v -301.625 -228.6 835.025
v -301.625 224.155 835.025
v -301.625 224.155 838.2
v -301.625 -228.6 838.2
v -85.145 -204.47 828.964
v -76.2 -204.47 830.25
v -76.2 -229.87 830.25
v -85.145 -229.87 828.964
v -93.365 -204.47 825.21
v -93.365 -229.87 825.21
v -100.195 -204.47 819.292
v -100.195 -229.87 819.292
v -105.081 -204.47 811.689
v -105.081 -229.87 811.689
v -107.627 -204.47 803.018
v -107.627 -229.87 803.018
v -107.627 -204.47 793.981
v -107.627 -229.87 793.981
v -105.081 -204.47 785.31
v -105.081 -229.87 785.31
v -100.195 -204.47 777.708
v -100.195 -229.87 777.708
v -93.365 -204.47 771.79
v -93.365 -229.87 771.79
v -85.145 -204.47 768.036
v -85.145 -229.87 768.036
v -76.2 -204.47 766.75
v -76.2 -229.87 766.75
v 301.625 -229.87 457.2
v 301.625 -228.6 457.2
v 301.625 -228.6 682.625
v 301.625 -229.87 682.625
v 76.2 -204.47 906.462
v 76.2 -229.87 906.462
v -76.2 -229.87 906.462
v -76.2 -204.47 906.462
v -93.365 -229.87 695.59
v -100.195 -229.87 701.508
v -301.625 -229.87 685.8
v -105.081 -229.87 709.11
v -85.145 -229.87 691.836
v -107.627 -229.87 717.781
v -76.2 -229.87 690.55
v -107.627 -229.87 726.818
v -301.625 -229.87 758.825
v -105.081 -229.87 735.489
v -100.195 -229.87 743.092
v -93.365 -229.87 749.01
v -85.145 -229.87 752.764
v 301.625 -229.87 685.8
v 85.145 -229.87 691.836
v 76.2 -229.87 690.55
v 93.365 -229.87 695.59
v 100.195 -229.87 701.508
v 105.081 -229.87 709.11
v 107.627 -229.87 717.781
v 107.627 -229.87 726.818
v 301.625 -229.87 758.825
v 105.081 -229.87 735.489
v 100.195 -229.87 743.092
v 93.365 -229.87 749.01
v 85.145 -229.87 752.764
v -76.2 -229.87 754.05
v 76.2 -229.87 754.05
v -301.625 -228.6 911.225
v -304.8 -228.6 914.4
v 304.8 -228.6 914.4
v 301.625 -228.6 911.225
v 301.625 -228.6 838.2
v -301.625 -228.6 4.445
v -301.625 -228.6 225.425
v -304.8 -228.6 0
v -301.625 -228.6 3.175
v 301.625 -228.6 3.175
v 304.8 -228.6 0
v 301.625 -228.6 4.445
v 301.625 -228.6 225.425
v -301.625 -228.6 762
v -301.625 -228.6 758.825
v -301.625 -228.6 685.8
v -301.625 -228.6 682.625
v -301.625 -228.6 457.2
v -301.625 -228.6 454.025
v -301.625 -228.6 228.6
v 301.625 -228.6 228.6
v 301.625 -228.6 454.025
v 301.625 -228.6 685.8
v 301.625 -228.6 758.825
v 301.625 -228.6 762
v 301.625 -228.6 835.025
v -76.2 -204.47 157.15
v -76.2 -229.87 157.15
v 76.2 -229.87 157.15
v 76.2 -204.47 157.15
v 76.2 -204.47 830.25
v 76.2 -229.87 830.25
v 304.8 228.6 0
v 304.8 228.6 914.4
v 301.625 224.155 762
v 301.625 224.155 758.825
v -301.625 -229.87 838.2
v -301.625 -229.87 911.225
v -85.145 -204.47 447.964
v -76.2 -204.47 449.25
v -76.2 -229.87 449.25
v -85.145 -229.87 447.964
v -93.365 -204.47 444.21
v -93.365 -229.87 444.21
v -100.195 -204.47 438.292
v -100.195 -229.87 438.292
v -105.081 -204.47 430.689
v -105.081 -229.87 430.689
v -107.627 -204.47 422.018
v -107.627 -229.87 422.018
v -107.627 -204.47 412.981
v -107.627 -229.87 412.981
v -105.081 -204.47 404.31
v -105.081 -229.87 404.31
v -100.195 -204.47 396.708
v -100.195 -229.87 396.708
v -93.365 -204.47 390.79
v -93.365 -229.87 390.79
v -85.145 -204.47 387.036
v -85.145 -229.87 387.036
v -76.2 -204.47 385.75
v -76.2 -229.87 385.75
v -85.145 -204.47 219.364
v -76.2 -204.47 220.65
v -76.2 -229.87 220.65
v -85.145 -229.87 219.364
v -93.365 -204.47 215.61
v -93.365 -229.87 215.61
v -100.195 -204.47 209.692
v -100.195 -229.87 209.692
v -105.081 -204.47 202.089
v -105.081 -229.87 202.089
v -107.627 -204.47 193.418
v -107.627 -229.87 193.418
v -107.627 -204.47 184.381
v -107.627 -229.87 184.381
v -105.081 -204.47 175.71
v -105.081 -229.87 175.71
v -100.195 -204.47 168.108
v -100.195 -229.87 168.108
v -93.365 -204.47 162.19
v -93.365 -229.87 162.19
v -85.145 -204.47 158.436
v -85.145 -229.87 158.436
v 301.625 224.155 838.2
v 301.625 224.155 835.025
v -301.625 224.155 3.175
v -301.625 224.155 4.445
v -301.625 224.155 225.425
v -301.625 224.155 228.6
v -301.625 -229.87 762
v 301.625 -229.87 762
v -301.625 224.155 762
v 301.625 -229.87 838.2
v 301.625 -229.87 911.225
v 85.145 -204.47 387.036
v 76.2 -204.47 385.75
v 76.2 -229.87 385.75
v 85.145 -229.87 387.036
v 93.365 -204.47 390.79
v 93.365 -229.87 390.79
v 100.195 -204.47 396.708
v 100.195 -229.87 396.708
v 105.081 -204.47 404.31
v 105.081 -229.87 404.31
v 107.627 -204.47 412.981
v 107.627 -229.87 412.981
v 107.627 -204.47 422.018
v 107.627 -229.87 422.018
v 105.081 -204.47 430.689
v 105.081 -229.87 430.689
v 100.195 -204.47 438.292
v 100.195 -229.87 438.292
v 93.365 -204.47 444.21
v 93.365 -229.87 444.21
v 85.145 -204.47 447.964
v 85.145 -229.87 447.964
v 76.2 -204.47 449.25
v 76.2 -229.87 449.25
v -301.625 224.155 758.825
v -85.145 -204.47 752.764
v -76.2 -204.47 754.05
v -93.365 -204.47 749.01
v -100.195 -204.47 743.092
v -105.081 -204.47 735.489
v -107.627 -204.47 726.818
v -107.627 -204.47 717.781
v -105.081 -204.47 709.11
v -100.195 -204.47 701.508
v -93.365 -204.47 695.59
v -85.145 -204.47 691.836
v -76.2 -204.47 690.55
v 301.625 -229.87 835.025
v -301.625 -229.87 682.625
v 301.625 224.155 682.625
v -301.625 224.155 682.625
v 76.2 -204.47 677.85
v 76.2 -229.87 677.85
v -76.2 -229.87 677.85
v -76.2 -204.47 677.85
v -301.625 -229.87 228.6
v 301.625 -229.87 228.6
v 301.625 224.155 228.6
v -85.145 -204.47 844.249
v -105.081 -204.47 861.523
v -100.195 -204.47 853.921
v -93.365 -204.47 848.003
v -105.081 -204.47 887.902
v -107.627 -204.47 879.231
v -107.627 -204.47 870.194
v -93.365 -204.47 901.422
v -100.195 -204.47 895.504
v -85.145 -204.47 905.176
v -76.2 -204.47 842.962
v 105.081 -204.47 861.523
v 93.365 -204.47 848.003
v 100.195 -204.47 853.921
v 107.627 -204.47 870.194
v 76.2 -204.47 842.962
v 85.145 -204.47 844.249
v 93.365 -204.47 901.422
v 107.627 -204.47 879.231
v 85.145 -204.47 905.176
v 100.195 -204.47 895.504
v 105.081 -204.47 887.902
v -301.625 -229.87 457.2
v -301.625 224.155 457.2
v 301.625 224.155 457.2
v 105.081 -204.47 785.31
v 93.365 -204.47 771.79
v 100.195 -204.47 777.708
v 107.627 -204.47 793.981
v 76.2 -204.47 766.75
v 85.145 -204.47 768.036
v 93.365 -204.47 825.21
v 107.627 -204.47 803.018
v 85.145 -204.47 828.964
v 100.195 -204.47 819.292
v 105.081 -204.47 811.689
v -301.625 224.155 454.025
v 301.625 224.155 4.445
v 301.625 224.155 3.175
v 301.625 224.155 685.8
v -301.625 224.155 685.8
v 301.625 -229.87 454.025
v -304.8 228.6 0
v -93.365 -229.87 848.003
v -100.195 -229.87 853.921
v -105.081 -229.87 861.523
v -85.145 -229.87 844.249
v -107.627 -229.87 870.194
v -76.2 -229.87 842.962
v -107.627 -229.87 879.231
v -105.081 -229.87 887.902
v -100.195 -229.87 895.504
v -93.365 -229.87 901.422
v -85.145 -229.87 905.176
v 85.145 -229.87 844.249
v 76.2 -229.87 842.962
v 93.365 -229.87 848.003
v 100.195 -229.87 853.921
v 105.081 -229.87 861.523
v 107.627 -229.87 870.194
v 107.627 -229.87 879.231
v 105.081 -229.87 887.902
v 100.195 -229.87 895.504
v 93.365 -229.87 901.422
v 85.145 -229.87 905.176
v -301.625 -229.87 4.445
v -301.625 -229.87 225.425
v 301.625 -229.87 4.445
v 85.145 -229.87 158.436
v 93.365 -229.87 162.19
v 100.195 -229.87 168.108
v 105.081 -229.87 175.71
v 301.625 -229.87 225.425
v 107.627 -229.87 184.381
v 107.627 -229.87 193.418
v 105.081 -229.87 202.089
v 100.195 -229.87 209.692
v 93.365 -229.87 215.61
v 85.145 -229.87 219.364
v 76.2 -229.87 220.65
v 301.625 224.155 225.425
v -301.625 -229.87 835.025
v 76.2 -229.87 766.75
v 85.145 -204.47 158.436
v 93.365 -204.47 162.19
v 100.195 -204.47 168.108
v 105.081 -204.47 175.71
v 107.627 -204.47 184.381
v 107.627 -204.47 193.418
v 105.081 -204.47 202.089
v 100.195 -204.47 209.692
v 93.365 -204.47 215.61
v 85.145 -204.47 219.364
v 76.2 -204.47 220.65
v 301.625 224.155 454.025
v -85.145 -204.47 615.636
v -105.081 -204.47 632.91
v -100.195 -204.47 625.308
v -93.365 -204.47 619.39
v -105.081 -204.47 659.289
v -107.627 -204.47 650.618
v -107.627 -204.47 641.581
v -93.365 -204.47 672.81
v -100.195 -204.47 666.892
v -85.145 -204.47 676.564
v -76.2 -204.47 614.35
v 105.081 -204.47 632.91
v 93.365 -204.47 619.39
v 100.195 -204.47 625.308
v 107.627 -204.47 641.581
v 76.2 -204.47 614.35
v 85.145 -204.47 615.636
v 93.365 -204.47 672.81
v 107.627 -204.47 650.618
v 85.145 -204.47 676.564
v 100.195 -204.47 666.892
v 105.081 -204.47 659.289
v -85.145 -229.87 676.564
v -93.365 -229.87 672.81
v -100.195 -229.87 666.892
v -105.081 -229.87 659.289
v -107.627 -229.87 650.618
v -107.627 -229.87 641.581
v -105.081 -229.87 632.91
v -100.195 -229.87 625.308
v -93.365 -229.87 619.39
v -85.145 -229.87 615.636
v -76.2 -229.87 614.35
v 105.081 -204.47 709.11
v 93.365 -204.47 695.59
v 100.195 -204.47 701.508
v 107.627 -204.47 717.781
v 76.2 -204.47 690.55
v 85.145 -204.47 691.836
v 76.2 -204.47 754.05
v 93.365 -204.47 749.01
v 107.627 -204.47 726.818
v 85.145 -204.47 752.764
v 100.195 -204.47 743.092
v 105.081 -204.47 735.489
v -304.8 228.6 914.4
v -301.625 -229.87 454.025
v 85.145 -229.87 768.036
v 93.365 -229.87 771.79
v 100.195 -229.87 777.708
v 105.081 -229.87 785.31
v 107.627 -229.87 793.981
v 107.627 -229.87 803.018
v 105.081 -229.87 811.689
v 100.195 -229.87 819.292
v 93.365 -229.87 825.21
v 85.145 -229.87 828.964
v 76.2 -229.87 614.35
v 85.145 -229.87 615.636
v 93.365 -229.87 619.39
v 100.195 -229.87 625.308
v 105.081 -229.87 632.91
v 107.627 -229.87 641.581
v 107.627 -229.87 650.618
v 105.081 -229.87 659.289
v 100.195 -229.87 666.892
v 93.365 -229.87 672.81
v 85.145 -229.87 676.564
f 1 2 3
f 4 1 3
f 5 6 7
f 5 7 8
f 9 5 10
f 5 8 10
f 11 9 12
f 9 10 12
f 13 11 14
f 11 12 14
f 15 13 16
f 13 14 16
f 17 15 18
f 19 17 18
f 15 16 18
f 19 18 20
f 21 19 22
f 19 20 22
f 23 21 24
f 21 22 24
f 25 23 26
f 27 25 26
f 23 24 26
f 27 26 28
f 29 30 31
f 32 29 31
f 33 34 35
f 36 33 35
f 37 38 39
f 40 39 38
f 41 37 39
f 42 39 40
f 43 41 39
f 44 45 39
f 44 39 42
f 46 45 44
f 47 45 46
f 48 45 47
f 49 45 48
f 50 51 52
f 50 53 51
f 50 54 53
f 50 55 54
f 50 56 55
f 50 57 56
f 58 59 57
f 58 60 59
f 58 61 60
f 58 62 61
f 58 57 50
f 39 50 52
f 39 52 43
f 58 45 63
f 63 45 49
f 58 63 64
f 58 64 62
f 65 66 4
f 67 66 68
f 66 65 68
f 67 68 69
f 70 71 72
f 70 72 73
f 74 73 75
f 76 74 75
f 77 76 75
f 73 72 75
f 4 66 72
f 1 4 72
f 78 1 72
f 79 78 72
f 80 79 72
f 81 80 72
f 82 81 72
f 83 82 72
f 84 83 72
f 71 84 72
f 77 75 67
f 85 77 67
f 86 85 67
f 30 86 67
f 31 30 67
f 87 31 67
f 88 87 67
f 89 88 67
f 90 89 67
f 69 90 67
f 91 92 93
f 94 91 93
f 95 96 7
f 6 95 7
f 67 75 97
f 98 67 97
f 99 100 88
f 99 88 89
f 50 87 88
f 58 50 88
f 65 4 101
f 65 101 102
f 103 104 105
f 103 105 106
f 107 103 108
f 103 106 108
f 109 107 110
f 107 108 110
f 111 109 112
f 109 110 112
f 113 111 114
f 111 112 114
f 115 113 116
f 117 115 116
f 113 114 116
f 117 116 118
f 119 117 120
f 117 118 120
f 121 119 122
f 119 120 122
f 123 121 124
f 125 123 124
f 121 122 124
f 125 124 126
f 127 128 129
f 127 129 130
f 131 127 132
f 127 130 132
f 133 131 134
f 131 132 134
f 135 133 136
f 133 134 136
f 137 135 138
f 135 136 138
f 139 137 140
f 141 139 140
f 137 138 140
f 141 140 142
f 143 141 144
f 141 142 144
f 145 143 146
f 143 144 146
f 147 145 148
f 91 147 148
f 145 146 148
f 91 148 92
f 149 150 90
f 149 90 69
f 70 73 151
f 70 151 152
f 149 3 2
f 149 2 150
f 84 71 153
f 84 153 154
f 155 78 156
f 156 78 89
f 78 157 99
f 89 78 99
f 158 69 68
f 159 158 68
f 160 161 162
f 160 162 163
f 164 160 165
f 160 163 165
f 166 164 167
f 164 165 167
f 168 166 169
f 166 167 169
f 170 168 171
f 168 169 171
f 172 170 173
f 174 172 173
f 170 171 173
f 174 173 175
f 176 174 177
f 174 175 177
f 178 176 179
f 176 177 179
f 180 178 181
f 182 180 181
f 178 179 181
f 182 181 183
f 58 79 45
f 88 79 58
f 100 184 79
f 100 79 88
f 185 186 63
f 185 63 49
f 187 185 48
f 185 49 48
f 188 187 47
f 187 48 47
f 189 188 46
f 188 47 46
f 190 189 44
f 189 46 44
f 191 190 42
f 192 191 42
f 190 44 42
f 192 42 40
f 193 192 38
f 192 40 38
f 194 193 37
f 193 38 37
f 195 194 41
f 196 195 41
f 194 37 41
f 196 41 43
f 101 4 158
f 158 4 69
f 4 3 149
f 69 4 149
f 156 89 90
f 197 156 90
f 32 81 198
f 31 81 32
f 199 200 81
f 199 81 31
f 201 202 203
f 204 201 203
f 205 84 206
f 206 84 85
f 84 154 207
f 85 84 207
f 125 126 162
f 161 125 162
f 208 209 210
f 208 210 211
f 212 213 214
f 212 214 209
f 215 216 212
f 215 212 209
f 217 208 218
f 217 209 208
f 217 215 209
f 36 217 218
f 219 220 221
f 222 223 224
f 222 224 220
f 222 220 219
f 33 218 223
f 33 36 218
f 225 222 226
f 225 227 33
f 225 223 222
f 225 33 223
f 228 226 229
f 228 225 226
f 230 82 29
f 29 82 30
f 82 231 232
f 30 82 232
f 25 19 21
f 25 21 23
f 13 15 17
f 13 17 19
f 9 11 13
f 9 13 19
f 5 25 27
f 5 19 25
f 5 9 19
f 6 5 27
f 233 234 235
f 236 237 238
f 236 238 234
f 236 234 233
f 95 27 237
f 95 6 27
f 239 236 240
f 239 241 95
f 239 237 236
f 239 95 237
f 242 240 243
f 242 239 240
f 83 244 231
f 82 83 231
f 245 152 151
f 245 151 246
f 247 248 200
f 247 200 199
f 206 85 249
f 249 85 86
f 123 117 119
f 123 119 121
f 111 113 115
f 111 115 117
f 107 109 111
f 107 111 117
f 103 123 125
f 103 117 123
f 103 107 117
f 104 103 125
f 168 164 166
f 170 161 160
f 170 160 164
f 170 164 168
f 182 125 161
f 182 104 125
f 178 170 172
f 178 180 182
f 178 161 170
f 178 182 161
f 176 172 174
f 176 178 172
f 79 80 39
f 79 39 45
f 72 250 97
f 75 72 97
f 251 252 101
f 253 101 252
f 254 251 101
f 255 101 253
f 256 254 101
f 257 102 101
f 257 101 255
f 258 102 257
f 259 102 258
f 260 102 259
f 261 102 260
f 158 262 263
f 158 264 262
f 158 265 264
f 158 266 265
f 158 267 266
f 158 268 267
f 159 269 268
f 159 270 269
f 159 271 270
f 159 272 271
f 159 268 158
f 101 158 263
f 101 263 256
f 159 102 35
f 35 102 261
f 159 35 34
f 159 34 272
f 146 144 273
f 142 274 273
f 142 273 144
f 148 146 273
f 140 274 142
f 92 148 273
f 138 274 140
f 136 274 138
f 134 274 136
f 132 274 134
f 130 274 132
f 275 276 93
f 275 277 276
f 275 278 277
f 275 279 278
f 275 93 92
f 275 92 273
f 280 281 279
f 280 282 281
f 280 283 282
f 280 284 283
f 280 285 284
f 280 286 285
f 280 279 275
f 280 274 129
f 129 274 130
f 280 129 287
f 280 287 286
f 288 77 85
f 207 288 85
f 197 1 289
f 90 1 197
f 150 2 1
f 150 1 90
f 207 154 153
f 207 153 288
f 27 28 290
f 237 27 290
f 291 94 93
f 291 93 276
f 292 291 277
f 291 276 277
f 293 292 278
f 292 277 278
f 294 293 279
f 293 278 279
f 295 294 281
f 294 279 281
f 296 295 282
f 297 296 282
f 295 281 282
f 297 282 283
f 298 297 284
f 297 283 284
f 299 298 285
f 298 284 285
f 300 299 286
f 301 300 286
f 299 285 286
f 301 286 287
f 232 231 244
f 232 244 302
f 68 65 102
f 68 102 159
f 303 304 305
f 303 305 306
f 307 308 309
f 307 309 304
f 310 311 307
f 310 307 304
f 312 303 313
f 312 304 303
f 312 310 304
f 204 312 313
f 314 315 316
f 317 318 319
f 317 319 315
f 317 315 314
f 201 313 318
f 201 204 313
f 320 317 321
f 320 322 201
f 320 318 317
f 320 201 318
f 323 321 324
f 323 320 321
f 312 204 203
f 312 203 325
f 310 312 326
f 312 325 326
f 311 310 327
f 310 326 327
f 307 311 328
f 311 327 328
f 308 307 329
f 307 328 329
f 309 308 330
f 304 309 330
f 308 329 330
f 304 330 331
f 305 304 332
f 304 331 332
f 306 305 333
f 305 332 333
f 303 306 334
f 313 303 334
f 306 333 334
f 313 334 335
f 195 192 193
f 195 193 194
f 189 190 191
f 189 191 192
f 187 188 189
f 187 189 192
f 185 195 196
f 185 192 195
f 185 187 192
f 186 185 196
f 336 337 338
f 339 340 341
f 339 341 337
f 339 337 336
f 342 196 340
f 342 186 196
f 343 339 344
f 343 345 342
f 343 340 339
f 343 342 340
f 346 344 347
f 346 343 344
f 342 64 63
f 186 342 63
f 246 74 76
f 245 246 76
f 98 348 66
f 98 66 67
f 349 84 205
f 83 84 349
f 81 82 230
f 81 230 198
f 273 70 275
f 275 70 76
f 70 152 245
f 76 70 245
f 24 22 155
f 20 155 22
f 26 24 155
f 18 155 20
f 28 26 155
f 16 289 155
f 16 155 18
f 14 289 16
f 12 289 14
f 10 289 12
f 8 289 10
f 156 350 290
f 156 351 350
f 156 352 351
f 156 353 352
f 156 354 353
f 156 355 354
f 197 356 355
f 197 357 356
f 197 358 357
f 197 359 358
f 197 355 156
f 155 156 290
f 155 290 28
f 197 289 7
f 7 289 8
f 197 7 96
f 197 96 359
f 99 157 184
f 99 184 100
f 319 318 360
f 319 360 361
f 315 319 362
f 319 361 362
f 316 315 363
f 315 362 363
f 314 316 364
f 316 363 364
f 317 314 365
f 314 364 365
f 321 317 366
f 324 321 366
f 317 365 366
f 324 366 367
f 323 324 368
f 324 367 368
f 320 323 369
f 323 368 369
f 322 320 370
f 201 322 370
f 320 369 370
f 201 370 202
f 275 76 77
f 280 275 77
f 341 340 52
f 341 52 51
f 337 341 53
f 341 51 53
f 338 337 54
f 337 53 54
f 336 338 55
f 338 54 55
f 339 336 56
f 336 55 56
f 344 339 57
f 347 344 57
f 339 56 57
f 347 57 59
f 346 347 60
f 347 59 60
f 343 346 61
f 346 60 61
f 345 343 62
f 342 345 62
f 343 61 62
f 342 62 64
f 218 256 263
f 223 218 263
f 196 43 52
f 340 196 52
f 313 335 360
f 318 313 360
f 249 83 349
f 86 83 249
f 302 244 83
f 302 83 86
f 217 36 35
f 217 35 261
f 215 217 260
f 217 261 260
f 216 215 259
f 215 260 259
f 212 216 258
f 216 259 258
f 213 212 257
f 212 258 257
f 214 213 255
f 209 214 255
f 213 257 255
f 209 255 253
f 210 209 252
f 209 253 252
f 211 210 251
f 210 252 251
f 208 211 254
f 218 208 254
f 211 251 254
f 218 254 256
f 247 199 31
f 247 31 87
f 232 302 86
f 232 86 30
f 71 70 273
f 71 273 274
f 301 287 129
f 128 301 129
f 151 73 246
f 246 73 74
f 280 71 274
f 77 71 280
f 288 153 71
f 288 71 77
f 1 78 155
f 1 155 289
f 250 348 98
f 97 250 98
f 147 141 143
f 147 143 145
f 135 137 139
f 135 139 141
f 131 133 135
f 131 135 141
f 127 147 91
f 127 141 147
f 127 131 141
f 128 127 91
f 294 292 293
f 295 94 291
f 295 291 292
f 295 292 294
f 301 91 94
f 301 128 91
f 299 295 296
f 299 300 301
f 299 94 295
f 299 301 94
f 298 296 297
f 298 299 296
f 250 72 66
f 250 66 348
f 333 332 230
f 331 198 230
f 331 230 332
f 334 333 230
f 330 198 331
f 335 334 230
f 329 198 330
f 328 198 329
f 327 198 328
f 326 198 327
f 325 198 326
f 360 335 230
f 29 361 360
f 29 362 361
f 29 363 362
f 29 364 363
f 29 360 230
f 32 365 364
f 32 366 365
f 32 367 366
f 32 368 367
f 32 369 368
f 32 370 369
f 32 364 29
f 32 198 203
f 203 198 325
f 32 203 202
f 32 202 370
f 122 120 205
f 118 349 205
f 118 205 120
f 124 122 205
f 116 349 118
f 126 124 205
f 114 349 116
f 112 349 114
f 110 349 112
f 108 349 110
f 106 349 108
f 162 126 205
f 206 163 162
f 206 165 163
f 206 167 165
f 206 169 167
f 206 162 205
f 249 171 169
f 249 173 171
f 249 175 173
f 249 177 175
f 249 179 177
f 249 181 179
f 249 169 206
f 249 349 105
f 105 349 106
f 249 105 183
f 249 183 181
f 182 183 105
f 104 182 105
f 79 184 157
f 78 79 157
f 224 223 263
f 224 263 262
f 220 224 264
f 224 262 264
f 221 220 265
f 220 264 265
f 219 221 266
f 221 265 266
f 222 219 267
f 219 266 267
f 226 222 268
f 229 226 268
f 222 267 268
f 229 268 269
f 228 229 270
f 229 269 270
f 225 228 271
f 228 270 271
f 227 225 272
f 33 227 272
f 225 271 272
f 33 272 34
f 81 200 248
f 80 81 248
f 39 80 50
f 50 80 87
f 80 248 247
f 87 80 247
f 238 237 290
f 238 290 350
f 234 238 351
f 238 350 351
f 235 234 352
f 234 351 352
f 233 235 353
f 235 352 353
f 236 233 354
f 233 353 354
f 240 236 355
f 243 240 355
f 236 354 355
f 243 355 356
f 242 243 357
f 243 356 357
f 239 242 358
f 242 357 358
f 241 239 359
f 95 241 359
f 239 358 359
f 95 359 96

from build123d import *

# Parameters (mm, degrees)
F0_W     = 609.6
F0_H     = 457.2
F1_DEPTH = 914.4
F2_W     = 603.25
F2_H     = 908.05
F3_DEPTH = 452.755
F4_W     = 603.25
F4_H     = 73.025
F4_H_2   = 225.425
F4_H_3   = 220.98
F5_DEPTH = 454.025
F7_DEPTH = 25.4


with BuildPart() as f1:
    # F0 (on Top) → F1 (new body)
    with BuildSketch(Plane.XY):
        Rectangle(F0_W, F0_H)
    extrude(amount=F1_DEPTH)

    # F2 (on face) → F3 (cut)
    with BuildSketch(Plane.XZ.offset(228.6)):
        with Locations((0, 457.2)):
            Rectangle(F2_W, F2_H)
    extrude(amount=-F3_DEPTH, mode=Mode.SUBTRACT)

    # F4 (on face) → F5 (join)
    with BuildSketch(Plane.XZ.offset(-224.155)):
        with Locations((0, 874.7125)):
            Rectangle(F4_W, F4_H)
        with Locations((0, 798.5125)):
            Rectangle(F4_W, F4_H)
        with Locations((0, 722.3125)):
            Rectangle(F4_W, F4_H)
        with Locations((0, 569.9125)):
            Rectangle(F4_W, F4_H_2)
        with Locations((0, 341.3125)):
            Rectangle(F4_W, F4_H_2)
        with Locations((0, 114.935)):
            Rectangle(F4_W, F4_H_3)
    extrude(amount=F5_DEPTH)

    # F6 (on face) → F7 (cut)
    with BuildSketch(Plane.XZ.offset(229.87)):
        with BuildLine():
            Line((76.2, 906.4625), (0, 906.4625))
            Line((0, 906.4625), (0, 842.9625))
            Line((0, 842.9625), (76.2, 842.9625))
            ThreePointArc((76.2, 842.9625), (107.95, 874.7125), (76.2, 906.4625))
        make_face()
        with BuildLine():
            Line((0, 842.9625), (0, 906.4625))
            Line((0, 906.4625), (-76.2, 906.4625))
            ThreePointArc((-76.2, 906.4625), (-107.95, 874.7125), (-76.2, 842.9625))
            Line((-76.2, 842.9625), (0, 842.9625))
        make_face()
        with BuildLine():
            Line((76.2, 220.6498), (0, 220.6498))
            Line((0, 220.6498), (0, 157.1498))
            Line((0, 157.1498), (76.2, 157.1498))
            ThreePointArc((76.2, 157.1498), (107.95, 188.8998), (76.2, 220.6498))
        make_face()
        with BuildLine():
            Line((0, 157.1498), (0, 220.6498))
            Line((0, 220.6498), (-76.2, 220.6498))
            ThreePointArc((-76.2, 220.6498), (-107.95, 188.8998), (-76.2, 157.1498))
            Line((-76.2, 157.1498), (0, 157.1498))
        make_face()
        with BuildLine():
            Line((76.2, 449.2498), (0, 449.2498))
            Line((0, 449.2498), (0, 385.7498))
            Line((0, 385.7498), (76.2, 385.7498))
            ThreePointArc((76.2, 385.7498), (107.95, 417.4998), (76.2, 449.2498))
        make_face()
        with BuildLine():
            Line((0, 385.7498), (0, 449.2498))
            Line((0, 449.2498), (-76.2, 449.2498))
            ThreePointArc((-76.2, 449.2498), (-107.95, 417.4998), (-76.2, 385.7498))
            Line((-76.2, 385.7498), (0, 385.7498))
        make_face()
        with BuildLine():
            Line((76.2, 677.8498), (0, 677.8498))
            Line((0, 677.8498), (0, 614.3498))
            Line((0, 614.3498), (76.2, 614.3498))
            ThreePointArc((76.2, 614.3498), (107.95, 646.0998), (76.2, 677.8498))
        make_face()
        with BuildLine():
            Line((0, 614.3498), (0, 677.8498))
            Line((0, 677.8498), (-76.2, 677.8498))
            ThreePointArc((-76.2, 677.8498), (-107.95, 646.0998), (-76.2, 614.3498))
            Line((-76.2, 614.3498), (0, 614.3498))
        make_face()
        with BuildLine():
            Line((76.2, 754.0498), (0, 754.0498))
            Line((0, 754.0498), (0, 690.5498))
            Line((0, 690.5498), (76.2, 690.5498))
            ThreePointArc((76.2, 690.5498), (107.95, 722.2998), (76.2, 754.0498))
        make_face()
        with BuildLine():
            Line((0, 690.5498), (0, 754.0498))
            Line((0, 754.0498), (-76.2, 754.0498))
            ThreePointArc((-76.2, 754.0498), (-107.95, 722.2998), (-76.2, 690.5498))
            Line((-76.2, 690.5498), (0, 690.5498))
        make_face()
        with BuildLine():
            Line((76.2, 830.2498), (0, 830.2498))
            Line((0, 830.2498), (0, 766.7498))
            Line((0, 766.7498), (76.2, 766.7498))
            ThreePointArc((76.2, 766.7498), (107.95, 798.4998), (76.2, 830.2498))
        make_face()
        with BuildLine():
            Line((0, 766.7498), (0, 830.2498))
            Line((0, 830.2498), (-76.2, 830.2498))
            ThreePointArc((-76.2, 830.2498), (-107.95, 798.4998), (-76.2, 766.7498))
            Line((-76.2, 766.7498), (0, 766.7498))
        make_face()
    extrude(amount=-F7_DEPTH, mode=Mode.SUBTRACT)


solid = f1.part
